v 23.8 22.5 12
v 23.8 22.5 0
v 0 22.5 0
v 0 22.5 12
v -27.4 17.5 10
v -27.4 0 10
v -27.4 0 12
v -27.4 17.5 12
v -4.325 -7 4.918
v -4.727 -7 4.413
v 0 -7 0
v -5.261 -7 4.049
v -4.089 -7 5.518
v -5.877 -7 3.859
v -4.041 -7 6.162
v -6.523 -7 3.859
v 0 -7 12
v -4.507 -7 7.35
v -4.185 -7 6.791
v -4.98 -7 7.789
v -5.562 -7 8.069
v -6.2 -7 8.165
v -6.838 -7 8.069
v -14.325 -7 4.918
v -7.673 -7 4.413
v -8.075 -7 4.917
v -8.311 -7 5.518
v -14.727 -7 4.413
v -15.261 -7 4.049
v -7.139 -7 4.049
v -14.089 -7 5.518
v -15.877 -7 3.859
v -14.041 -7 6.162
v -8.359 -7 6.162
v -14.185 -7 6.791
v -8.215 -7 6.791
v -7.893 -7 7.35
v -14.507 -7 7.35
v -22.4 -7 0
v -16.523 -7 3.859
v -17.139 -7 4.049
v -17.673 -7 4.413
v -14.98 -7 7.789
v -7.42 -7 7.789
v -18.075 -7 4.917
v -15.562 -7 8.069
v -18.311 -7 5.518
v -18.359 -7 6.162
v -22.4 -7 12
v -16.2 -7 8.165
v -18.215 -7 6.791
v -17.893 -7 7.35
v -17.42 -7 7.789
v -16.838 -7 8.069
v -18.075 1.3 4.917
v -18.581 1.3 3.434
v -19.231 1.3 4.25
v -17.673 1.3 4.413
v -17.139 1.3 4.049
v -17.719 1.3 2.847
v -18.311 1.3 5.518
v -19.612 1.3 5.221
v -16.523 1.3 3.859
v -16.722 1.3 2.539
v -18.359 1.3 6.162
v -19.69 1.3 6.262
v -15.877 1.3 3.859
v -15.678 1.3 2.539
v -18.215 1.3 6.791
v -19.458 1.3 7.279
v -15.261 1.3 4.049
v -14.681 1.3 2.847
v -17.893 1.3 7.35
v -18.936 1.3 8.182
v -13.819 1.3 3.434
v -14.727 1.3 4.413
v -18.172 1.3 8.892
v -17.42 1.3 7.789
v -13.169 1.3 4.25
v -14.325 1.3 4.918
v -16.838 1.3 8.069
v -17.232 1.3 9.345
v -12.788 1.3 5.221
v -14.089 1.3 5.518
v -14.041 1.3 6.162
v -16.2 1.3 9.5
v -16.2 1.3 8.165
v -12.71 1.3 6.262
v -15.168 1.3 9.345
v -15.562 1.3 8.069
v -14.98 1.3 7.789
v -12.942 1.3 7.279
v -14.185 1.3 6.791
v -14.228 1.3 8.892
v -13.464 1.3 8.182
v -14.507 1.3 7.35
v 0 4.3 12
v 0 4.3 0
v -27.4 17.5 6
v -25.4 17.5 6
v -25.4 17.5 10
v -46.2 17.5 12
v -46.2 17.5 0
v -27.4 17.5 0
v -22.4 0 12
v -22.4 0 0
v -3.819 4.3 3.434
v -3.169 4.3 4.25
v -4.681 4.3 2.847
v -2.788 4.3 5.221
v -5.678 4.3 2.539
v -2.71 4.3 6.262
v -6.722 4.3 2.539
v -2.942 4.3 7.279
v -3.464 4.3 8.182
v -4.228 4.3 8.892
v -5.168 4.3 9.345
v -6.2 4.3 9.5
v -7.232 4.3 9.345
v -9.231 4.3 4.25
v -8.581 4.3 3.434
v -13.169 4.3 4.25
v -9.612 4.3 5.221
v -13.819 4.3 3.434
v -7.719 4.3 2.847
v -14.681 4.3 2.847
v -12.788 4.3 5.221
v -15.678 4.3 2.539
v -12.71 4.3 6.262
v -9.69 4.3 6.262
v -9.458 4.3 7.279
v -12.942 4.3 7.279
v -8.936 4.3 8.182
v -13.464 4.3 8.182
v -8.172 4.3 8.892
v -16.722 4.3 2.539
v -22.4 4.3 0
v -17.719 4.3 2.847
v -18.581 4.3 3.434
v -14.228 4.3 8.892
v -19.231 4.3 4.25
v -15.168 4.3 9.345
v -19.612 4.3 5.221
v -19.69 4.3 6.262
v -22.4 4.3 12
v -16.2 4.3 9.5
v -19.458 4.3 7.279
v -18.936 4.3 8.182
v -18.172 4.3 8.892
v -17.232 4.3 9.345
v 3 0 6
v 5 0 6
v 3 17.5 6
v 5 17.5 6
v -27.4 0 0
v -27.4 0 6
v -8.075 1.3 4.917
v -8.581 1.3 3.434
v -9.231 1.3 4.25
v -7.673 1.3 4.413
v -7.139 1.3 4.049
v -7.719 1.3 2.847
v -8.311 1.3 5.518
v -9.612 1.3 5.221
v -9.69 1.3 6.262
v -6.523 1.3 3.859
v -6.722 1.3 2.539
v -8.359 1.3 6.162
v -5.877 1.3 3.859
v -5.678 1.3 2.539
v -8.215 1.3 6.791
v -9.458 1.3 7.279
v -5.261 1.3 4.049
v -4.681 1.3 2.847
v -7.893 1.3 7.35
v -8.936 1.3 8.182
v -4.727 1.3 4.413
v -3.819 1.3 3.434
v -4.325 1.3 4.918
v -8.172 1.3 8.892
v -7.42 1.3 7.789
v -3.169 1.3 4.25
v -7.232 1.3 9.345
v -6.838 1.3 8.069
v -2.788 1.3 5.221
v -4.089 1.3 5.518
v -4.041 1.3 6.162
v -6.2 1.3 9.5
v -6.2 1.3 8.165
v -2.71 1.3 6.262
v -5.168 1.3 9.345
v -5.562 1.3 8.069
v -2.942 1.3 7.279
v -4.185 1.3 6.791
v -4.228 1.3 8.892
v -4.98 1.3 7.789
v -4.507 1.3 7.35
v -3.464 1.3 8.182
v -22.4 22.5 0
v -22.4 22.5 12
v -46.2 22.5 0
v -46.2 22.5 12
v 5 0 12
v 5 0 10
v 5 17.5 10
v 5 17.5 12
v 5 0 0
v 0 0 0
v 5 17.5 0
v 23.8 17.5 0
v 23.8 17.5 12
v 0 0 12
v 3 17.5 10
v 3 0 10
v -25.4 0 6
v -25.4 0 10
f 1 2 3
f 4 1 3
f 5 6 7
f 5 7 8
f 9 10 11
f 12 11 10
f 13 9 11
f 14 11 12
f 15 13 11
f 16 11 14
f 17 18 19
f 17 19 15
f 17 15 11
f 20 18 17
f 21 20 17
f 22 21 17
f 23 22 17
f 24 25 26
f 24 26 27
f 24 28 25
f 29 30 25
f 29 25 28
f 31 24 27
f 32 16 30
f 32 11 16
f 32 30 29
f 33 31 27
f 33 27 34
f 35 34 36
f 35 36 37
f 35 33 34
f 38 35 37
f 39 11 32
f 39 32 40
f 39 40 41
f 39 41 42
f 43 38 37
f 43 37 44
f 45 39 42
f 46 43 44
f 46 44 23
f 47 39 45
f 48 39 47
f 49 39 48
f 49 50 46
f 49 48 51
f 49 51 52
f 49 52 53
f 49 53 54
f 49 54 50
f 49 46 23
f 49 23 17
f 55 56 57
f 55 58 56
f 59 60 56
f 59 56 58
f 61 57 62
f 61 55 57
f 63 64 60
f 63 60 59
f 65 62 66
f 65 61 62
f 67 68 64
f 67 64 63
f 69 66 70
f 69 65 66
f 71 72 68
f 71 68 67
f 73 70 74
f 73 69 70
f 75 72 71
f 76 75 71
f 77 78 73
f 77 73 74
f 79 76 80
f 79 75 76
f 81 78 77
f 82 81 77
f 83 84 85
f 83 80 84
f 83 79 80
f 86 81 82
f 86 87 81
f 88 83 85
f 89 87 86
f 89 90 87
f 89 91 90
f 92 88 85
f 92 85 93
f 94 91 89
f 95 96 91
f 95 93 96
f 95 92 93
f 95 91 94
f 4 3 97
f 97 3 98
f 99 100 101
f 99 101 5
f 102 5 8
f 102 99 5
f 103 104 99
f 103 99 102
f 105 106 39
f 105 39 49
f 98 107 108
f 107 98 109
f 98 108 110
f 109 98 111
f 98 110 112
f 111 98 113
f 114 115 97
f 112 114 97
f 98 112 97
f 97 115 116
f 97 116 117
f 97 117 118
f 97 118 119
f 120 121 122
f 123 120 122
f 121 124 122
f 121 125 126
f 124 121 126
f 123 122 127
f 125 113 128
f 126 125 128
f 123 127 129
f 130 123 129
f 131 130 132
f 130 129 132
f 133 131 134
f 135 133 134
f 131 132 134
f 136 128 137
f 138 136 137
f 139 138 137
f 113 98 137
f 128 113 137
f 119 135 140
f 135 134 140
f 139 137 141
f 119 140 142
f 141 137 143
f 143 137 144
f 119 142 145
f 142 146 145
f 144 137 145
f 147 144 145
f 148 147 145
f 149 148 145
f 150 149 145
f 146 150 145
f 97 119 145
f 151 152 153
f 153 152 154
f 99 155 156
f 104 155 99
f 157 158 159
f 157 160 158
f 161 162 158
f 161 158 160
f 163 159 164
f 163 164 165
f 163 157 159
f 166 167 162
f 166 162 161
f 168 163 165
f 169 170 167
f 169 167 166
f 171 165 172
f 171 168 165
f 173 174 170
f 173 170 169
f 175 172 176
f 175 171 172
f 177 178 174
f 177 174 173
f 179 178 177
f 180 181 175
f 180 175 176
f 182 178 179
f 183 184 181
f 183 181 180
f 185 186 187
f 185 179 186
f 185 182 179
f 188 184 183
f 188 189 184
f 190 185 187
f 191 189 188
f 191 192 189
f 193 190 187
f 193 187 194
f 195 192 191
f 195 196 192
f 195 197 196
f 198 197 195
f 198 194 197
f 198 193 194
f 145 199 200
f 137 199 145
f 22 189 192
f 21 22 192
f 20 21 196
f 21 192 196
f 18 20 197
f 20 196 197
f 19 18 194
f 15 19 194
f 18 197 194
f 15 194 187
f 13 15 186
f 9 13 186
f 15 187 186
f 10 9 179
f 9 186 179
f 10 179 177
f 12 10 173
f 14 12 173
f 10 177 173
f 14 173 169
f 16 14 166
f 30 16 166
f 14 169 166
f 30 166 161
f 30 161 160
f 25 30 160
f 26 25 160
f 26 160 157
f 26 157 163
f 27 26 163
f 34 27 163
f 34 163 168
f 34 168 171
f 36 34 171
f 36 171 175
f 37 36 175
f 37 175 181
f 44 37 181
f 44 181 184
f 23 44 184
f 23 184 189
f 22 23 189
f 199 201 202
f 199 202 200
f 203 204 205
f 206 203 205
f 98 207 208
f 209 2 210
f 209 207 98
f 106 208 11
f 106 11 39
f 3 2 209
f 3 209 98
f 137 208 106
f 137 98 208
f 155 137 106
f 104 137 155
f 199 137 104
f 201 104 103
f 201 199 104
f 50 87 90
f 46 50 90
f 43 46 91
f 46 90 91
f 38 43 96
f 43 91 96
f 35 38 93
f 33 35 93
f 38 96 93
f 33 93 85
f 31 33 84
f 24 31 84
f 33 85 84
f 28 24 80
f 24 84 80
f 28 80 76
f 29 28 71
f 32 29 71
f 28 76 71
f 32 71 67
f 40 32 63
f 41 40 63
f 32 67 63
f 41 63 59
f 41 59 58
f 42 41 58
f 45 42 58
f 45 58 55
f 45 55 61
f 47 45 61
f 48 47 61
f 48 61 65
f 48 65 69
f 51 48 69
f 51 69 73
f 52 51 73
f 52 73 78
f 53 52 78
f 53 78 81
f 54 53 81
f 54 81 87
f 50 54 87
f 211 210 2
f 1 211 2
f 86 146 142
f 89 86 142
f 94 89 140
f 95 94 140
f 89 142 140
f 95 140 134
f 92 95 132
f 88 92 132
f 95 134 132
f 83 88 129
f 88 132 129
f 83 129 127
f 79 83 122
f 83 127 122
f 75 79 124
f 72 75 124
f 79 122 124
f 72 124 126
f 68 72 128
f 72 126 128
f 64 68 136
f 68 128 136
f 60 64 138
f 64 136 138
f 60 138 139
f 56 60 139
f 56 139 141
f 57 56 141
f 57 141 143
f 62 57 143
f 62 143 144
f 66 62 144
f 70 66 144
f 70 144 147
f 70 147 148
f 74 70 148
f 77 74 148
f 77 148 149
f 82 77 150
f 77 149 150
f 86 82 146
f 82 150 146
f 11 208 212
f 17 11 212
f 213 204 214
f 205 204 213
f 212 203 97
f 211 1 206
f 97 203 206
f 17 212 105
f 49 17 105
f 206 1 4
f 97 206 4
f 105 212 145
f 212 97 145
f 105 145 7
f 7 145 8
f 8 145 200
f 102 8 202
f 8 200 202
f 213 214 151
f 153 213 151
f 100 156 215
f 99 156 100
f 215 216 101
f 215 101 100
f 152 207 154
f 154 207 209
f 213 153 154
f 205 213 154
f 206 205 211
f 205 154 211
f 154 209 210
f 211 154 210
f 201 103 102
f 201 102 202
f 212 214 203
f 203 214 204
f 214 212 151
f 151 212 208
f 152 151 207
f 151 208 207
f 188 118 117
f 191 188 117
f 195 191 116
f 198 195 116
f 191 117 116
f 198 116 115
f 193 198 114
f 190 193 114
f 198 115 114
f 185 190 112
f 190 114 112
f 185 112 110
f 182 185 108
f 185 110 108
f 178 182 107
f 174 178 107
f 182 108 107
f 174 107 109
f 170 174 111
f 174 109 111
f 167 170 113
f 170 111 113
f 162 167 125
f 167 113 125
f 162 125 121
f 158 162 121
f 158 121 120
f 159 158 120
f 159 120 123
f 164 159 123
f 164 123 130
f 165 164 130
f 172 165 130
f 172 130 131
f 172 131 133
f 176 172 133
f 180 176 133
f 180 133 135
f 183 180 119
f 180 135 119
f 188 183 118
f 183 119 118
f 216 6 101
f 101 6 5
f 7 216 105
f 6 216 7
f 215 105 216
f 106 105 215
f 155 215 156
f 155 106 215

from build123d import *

# Parameters (mm, degrees)
BOSS_EXTRUDE2_DEPTH = 12
SKETCH3_W           = 4
SKETCH3_H           = 17.5
CUT_EXTRUDE1_DEPTH  = 2
SKETCH4_W           = 12
SKETCH4_H           = 11.3
BOSS_EXTRUDE3_DEPTH = 11.2
SKETCH5_R           = 3.5
CUT_EXTRUDE2_DEPTH  = 3
SKETCH6_R           = 2.165
CUT_EXTRUDE3_DEPTH  = 53.229110657


with BuildPart() as part:
    # Sketch2 → Boss-Extrude2 (new body)
    with BuildSketch(Plane.XY):
        Polygon((0, 0), (5, 0), (5, 17.5), (23.8, 17.5), (23.8, 22.5), (0, 22.5), (0, 17.5), align=None)
    boss_extrude2 = extrude(amount=BOSS_EXTRUDE2_DEPTH)

    # Sketch3 → Cut-Extrude1 (cut)
    with BuildSketch(Plane(origin=(5, 0, 0), x_dir=(0, 0, -1), z_dir=(1, 0, 0))):
        with Locations((-8, 8.75)):
            Rectangle(SKETCH3_W, SKETCH3_H)
    cut_extrude1 = extrude(amount=-CUT_EXTRUDE1_DEPTH, mode=Mode.SUBTRACT)

    # Sketch4 → Boss-Extrude3 (add)
    with BuildSketch(Plane.ZY):
        with Locations((6, -1.35)):
            Rectangle(SKETCH4_W, SKETCH4_H)
    boss_extrude3 = extrude(amount=BOSS_EXTRUDE3_DEPTH)

    # Mirror4: Boss-Extrude3 across plane
    add(boss_extrude3.mirror(Plane.ZY.offset(11.2)))

    # Mirror5: Boss-Extrude2 across plane
    add(boss_extrude2.mirror(Plane.ZY.offset(11.2)))

    # Mirror6: Cut-Extrude1 across plane
    add(cut_extrude1.mirror(Plane.ZY.offset(11.2)), mode=Mode.SUBTRACT)

    # Sketch5 → Cut-Extrude2 (cut)
    with BuildSketch(Plane(origin=(0, 4.3, 0), x_dir=(1, 0, 0), z_dir=(0, 1, 0))):
        with Locations(Location((-16.2, -6, 0), (0, 0, 270))):
            Circle(SKETCH5_R)
        with Locations(Location((-6.2, -6, 0), (0, 0, 270))):
            Circle(SKETCH5_R)
    extrude(amount=-CUT_EXTRUDE2_DEPTH, mode=Mode.SUBTRACT)

    # Sketch6 → Cut-Extrude3 (cut, through all)
    with BuildSketch(Plane(origin=(0, 1.3, 0), x_dir=(1, 0, 0), z_dir=(0, 1, 0))):
        with Locations(Location((-16.2, -6, 0), (0, 0, 270))):
            Circle(SKETCH6_R)
        with Locations(Location((-6.2, -6, 0), (0, 0, 270))):
            Circle(SKETCH6_R)
    extrude(amount=-CUT_EXTRUDE3_DEPTH, mode=Mode.SUBTRACT)


solid = part.part
